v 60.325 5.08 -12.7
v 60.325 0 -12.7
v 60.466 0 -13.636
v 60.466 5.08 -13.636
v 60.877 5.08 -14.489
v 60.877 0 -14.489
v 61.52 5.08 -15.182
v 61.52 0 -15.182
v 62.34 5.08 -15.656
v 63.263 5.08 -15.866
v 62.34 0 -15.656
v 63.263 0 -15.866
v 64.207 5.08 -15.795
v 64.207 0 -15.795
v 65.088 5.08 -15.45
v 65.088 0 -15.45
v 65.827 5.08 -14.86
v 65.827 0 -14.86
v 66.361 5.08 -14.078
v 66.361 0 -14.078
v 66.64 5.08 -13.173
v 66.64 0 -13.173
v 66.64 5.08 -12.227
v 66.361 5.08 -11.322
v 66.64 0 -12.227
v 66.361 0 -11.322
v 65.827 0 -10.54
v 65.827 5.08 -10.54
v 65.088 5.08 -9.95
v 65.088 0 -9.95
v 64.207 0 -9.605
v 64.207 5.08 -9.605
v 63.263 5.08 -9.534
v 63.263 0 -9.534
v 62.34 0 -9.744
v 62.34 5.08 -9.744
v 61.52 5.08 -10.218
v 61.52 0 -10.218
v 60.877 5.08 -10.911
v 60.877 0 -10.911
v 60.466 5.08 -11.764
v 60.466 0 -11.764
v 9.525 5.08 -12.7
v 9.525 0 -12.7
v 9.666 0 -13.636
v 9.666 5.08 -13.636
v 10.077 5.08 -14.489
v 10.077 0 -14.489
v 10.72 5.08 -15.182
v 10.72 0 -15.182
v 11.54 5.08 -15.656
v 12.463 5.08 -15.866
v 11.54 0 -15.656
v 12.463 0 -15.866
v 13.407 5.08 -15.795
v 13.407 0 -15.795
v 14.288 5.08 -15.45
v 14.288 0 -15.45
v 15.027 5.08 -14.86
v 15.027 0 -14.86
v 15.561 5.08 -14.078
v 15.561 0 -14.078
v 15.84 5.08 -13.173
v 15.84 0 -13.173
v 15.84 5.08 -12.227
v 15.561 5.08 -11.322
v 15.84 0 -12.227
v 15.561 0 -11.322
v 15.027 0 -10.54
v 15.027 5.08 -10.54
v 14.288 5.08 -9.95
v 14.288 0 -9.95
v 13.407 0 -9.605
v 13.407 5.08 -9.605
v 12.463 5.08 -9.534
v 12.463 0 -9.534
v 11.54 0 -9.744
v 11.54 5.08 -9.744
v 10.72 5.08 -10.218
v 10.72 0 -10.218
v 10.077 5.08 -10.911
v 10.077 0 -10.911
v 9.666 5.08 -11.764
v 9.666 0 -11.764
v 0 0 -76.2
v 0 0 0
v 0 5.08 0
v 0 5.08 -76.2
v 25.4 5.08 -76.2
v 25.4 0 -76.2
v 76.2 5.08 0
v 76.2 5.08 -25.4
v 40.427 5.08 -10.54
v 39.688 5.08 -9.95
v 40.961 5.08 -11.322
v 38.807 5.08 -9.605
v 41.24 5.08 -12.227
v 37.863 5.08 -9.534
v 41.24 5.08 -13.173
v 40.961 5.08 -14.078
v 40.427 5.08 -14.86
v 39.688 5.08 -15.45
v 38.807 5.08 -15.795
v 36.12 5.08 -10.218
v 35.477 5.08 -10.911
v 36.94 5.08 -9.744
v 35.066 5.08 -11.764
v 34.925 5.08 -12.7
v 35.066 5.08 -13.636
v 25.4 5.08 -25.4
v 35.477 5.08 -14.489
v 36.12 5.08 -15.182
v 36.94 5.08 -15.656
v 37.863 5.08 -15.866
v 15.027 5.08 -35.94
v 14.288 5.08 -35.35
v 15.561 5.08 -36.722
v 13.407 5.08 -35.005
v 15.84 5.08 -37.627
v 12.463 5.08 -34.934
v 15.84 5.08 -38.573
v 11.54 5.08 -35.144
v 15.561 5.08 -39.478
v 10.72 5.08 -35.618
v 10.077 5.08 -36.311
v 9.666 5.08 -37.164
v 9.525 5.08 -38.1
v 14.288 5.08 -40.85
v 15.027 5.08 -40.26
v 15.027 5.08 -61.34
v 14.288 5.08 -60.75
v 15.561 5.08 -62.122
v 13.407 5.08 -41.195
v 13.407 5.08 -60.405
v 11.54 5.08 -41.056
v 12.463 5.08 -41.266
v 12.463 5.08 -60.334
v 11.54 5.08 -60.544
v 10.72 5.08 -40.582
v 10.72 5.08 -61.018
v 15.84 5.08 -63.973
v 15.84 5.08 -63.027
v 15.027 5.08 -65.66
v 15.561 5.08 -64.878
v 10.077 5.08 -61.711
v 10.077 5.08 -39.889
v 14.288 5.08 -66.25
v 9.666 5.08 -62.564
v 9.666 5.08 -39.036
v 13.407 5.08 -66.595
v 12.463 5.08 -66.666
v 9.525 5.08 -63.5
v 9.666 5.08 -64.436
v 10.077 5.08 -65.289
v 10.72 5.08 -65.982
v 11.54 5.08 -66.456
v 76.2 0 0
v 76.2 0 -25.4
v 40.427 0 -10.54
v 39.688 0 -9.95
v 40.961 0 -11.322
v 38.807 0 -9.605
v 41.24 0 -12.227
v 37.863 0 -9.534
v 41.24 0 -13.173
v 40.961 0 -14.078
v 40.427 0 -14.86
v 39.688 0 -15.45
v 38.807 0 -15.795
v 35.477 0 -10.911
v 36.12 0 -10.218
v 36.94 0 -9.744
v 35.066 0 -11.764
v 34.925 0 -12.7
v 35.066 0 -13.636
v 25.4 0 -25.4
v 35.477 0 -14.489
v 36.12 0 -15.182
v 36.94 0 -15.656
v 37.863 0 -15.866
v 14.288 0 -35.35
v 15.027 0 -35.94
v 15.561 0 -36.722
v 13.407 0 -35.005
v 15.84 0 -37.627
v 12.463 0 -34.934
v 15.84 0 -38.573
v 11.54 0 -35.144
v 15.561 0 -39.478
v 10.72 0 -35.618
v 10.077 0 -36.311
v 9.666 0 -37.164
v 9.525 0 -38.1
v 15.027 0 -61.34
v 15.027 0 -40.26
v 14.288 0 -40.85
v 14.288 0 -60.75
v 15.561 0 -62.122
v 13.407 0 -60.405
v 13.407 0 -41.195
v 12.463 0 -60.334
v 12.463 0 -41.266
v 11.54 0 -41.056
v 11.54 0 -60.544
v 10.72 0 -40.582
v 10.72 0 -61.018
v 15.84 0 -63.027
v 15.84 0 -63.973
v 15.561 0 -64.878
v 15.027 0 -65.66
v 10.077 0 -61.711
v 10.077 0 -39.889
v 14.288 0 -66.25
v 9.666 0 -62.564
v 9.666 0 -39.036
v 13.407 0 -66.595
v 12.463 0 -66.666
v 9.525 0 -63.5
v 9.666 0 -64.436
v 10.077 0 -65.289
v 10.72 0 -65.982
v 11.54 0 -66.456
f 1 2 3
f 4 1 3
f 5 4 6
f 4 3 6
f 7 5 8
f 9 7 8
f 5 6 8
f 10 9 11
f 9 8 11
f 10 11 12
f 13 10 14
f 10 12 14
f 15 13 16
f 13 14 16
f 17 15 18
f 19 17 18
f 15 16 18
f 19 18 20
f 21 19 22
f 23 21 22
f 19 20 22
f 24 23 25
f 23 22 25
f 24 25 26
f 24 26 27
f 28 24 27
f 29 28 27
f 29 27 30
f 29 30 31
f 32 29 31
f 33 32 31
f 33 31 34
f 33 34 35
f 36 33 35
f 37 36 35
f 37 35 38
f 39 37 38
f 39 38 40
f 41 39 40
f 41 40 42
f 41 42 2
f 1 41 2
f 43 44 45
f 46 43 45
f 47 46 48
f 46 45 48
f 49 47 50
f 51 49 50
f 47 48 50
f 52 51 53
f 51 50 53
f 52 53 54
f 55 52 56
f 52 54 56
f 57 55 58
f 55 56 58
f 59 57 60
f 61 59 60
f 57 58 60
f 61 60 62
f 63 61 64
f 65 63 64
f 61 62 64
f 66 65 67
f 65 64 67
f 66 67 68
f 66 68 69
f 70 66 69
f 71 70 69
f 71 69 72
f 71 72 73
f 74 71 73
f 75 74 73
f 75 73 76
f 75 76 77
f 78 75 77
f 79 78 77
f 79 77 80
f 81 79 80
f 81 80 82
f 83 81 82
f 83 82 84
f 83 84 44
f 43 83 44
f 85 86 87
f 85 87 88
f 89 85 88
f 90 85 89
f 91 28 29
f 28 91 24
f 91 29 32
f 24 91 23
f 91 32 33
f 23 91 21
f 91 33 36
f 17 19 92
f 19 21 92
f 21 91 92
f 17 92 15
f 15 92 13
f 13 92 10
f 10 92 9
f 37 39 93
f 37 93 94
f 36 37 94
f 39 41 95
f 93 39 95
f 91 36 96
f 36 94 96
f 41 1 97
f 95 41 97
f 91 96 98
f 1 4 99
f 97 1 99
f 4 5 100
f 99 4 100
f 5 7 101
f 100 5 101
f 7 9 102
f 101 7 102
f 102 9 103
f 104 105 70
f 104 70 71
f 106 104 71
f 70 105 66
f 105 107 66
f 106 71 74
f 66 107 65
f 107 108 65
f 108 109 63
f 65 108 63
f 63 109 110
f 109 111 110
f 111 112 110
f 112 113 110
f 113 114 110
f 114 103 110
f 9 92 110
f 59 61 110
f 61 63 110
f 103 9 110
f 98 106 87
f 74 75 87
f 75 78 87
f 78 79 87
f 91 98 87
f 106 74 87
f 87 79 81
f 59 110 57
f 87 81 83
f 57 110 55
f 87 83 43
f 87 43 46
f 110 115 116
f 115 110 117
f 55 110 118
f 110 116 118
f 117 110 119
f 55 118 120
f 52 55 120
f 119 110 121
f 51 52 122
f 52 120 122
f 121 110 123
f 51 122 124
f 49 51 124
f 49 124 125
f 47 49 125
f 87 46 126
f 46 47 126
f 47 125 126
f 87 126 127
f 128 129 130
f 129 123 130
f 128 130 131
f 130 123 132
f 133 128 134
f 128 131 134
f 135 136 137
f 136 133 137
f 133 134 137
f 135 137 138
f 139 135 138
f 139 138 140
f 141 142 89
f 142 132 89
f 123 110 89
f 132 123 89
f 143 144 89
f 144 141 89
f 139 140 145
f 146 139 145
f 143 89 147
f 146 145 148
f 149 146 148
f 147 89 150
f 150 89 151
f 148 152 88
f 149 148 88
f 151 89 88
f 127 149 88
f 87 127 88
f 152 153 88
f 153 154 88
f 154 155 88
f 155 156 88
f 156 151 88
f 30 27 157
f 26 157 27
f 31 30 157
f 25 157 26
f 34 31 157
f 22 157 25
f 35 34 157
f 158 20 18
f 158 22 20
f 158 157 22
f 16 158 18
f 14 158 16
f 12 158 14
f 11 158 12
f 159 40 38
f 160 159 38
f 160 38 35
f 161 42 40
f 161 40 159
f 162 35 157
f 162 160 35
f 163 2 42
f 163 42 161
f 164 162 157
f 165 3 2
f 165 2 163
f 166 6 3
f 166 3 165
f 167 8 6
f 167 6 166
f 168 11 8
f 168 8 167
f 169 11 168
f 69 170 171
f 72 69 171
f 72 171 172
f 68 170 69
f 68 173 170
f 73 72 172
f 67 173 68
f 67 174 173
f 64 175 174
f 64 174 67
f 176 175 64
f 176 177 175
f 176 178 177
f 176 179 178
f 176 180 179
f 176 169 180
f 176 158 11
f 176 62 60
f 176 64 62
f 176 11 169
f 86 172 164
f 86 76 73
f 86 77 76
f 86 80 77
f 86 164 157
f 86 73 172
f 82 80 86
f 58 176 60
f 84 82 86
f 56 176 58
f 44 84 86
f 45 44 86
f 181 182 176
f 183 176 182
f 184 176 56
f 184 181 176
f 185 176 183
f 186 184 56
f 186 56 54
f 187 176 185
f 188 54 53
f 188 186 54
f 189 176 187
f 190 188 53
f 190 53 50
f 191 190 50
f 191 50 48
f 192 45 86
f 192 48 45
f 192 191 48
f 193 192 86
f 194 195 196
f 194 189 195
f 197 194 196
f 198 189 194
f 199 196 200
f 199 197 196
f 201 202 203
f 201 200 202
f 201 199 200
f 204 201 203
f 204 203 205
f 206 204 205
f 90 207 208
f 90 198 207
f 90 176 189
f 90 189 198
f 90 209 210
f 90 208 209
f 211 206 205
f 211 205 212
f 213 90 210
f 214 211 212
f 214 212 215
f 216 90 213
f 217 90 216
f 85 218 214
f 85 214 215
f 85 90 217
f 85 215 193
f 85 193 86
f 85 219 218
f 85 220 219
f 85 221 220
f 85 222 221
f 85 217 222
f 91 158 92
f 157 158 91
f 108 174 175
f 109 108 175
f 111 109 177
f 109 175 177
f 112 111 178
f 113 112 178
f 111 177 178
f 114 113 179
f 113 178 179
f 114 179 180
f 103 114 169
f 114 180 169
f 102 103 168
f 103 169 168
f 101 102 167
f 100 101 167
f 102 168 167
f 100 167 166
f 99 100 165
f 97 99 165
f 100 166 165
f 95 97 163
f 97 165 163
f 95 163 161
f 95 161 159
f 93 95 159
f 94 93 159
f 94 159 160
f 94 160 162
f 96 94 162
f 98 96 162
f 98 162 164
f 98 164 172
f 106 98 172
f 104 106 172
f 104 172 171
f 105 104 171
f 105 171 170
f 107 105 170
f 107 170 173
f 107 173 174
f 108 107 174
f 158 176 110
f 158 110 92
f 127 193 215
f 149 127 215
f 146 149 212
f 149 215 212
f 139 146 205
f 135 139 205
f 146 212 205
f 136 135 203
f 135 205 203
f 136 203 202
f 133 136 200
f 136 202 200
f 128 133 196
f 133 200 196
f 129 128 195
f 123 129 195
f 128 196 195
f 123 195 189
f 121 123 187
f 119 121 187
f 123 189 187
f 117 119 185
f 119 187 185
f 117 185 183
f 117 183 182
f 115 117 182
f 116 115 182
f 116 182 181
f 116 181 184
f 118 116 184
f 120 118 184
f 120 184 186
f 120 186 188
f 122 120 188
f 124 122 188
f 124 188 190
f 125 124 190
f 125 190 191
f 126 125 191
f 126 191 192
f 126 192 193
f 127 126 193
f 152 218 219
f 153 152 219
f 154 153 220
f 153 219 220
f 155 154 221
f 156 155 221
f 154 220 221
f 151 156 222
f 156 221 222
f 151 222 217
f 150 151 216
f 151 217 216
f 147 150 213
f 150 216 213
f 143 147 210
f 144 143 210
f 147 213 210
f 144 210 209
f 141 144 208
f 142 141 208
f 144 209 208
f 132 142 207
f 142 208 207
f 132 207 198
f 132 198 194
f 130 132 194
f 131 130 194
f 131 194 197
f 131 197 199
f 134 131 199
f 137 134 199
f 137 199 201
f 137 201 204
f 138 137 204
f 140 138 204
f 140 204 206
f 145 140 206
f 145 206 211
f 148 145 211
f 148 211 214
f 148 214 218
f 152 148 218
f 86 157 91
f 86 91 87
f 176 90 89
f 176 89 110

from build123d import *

# Parameters (mm, degrees)
BOSS_EXTRUDE1_DEPTH             = 5.08
F_1_4_0_25_DIAMETER_HOLE1_D     = 6.35
F_1_4_0_25_DIAMETER_HOLE1_DEPTH = 25.4
F_1_4_0_25_DIAMETER_HOLE1_TIP   = 1.907732465


with BuildPart() as part:
    # Sketch1 → Boss-Extrude1 (new body)
    with BuildSketch(Plane(origin=(0, 0, 0), x_dir=(1, 0, 0), z_dir=(0, 1, 0))):
        Polygon((0, 0), (0, 76.2), (25.4, 76.2), (25.4, 25.4), (76.2, 25.4), (76.2, 0), align=None)
    extrude(amount=BOSS_EXTRUDE1_DEPTH)

    # 1/4 (0.25) Diameter Hole1
    with Locations(Plane(origin=(0, 5.08, 0), x_dir=(1, 0, 0), z_dir=(0, 1, 0))):
        with Locations((12.7, 63.5), (12.7, 38.1), (12.7, 12.7), (38.1, 12.7), (63.5, 12.7)):
            Hole(F_1_4_0_25_DIAMETER_HOLE1_D / 2, depth=F_1_4_0_25_DIAMETER_HOLE1_DEPTH)
            with Locations((0, 0, -(F_1_4_0_25_DIAMETER_HOLE1_DEPTH + F_1_4_0_25_DIAMETER_HOLE1_TIP / 2))):  # 118° drill point
                Cone(0, F_1_4_0_25_DIAMETER_HOLE1_D / 2, F_1_4_0_25_DIAMETER_HOLE1_TIP, mode=Mode.SUBTRACT)


solid = part.part
